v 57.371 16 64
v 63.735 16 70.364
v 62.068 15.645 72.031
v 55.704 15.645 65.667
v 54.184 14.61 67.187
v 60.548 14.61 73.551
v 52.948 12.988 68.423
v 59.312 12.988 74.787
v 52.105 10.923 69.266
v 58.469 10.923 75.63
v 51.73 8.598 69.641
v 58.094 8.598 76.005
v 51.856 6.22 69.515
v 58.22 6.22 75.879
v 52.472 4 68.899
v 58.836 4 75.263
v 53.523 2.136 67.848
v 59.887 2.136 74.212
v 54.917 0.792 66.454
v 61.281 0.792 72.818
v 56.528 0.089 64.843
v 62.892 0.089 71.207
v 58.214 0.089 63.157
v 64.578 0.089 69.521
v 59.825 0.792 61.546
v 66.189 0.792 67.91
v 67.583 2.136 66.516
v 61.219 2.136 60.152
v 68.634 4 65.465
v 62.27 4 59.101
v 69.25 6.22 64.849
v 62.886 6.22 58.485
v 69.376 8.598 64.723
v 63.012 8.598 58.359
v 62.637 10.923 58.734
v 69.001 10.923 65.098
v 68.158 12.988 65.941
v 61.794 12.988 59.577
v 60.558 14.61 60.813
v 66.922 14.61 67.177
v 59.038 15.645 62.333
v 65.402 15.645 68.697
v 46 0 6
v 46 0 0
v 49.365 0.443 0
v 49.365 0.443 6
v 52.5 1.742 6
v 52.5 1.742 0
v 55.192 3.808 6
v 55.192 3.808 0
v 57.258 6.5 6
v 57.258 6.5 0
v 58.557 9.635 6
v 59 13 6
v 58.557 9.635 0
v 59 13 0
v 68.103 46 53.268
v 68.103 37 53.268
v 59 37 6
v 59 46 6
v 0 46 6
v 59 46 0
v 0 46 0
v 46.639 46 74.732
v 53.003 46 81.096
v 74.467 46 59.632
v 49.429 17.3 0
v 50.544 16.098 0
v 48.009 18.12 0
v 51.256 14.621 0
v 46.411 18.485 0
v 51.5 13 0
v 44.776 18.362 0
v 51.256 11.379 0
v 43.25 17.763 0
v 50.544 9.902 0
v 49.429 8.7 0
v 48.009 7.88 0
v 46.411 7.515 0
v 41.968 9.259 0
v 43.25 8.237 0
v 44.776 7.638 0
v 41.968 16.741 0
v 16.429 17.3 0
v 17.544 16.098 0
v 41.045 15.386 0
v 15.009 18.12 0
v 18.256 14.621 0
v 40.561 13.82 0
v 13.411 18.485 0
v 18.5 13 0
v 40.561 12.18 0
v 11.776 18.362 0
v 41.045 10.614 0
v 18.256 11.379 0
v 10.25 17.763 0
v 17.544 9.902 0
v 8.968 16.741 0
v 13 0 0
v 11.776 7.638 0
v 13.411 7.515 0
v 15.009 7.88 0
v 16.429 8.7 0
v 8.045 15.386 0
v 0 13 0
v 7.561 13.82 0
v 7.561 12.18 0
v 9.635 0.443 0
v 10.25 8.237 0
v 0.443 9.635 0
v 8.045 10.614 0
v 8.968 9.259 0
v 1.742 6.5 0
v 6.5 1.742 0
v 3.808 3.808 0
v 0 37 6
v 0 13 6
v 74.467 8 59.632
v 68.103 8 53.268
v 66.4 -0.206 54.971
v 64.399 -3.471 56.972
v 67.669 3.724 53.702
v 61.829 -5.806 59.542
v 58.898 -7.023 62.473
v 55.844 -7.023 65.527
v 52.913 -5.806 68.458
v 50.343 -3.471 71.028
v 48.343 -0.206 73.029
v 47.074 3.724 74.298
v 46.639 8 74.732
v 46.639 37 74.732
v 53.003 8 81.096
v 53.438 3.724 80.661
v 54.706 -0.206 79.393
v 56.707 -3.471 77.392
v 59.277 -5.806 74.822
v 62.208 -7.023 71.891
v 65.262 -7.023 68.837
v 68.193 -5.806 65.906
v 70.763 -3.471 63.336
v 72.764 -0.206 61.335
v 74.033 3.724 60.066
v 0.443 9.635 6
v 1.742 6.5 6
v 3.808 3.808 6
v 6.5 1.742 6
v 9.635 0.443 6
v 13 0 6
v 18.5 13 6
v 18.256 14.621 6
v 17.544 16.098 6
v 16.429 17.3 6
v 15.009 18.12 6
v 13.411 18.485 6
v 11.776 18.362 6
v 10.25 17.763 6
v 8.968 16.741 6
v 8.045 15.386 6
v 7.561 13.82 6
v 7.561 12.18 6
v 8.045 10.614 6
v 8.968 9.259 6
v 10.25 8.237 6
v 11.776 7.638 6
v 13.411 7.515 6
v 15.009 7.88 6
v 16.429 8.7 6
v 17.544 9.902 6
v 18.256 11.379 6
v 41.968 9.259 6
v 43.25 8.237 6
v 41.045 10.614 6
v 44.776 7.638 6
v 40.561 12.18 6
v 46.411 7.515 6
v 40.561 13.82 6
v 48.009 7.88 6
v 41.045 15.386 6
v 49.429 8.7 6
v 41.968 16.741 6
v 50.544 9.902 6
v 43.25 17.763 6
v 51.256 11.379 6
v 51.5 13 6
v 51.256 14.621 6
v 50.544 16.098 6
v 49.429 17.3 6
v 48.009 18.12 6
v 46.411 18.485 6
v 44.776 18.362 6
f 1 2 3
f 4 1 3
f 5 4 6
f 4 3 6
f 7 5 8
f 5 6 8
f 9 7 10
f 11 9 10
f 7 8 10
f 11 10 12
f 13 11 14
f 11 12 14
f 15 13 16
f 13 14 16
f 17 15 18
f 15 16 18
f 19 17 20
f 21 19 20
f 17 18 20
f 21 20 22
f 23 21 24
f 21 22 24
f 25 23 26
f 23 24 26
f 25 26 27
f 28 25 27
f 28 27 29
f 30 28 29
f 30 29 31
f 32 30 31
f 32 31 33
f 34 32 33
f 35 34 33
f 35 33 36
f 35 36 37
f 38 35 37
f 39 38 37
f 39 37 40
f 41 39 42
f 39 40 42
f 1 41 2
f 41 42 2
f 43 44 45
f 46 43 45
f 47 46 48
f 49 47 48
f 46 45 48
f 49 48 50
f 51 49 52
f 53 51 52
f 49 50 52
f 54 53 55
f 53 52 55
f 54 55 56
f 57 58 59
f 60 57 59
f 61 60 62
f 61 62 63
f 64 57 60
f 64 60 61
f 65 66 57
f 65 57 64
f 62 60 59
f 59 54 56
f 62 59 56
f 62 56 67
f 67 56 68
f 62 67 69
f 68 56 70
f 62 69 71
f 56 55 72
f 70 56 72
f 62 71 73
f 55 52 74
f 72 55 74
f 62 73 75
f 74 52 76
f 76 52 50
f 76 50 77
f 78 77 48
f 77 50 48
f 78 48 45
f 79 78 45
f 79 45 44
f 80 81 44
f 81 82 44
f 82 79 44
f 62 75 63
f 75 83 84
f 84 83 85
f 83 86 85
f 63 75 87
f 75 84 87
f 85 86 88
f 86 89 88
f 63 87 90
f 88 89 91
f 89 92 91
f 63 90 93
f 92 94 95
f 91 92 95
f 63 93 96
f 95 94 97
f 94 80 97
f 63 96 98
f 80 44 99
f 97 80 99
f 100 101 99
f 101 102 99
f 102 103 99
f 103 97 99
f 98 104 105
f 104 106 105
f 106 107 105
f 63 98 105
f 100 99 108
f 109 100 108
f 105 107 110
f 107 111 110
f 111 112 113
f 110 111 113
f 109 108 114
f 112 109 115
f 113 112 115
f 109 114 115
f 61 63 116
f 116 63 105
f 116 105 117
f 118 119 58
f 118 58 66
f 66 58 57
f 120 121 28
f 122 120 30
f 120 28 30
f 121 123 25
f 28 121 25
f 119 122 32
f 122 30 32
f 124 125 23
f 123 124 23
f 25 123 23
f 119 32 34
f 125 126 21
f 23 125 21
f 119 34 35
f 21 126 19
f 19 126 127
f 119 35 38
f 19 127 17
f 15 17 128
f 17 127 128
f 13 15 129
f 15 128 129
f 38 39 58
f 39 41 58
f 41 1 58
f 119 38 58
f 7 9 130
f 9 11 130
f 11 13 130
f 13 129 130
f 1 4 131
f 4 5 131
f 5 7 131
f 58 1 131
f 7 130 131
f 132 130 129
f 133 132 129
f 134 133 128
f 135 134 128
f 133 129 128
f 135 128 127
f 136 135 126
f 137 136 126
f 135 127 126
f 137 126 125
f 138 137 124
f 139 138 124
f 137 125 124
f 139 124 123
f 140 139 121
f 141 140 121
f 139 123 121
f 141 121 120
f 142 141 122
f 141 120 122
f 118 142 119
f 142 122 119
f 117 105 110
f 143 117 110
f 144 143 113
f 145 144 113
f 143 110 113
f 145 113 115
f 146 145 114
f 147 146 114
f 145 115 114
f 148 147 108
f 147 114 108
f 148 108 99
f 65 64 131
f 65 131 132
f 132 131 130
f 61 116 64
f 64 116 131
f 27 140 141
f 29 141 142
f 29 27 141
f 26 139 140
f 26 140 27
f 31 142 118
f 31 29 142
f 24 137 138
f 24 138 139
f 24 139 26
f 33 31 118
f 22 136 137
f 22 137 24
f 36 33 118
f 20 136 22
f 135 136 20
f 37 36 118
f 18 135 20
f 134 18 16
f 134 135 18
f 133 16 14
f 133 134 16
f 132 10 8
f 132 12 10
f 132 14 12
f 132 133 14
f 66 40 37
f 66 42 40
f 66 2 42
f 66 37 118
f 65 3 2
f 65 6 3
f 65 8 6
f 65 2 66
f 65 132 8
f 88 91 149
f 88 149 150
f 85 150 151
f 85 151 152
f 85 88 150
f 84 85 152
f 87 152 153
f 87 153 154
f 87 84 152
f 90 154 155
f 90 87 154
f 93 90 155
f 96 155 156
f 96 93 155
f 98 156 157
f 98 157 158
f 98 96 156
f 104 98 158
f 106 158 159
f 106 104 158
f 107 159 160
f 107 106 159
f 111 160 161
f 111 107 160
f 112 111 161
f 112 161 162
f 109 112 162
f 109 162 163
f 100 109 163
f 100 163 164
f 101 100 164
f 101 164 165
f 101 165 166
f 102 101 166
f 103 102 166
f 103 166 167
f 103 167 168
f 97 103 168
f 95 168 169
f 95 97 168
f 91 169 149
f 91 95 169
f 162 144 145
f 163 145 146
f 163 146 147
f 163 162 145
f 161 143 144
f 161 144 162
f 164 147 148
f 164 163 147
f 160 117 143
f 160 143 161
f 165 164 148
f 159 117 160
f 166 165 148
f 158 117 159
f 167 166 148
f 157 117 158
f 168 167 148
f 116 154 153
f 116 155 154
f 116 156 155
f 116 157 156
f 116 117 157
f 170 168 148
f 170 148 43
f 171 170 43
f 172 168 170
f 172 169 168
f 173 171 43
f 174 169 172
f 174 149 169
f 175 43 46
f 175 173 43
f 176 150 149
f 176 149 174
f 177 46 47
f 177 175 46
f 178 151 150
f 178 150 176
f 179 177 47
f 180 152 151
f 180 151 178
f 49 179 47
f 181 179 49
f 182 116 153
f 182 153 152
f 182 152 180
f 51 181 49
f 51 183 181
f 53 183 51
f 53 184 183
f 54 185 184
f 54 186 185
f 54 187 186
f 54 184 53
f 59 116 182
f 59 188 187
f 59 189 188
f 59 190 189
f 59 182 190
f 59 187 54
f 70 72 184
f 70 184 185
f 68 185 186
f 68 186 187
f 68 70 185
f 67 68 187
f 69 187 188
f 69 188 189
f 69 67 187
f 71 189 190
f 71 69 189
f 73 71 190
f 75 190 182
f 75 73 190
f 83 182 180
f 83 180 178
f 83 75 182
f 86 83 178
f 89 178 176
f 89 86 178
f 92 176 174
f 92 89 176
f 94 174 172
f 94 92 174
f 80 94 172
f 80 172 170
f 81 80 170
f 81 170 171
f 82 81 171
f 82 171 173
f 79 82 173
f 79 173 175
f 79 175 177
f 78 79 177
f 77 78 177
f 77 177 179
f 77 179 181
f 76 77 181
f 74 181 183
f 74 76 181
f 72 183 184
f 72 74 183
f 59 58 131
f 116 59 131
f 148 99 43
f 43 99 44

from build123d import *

# Parameters (mm, degrees)
F0_R     = 5.5
F1_DEPTH = 6
F3_DEPTH = 9
F5_DEPTH = 9
F6_R     = 8
F7_DEPTH = 9


with BuildPart() as f1:
    # F0 (on Top) → F1 (new body)
    with BuildSketch(Plane.XY):
        with BuildLine():
            Line((59, 37), (0, 37))
            Line((0, 37), (0, 13))
            ThreePointArc((0, 13), (3.807612, 3.807612), (13, 0))
            Line((13, 0), (46, 0))
            ThreePointArc((46, 0), (55.192388, 3.807612), (59, 13))
            Line((59, 13), (59, 37))
        make_face()
        with Locations((13, 13)):
            Circle(F0_R, mode=Mode.SUBTRACT)
        with Locations((46, 13)):
            Circle(F0_R, mode=Mode.SUBTRACT)
    extrude(amount=F1_DEPTH)

    # F2 (on face) → F3 (join)
    with BuildSketch(Plane(origin=(0, 37, 0), x_dir=(-1, 0, 0), z_dir=(0, 1, 0))):
        Polygon((-68.103316, 53.267747), (-59, 6), (-59, 0), (0, 0), (0, 6), (-46.63881, 74.732253), align=None)
    extrude(amount=F3_DEPTH)

    # F4 (on face) → F5 (join)
    with BuildSketch(Plane(origin=(60.685531, 0, 60.685531), x_dir=(0, 1, 0), z_dir=(0.707107, 0, 0.707107))):
        with BuildLine():
            Line((46, 19.865064), (37, 19.865064))
            Line((37, 19.865064), (8, 19.865064))
            ThreePointArc((8, 19.865064), (-7.177698, 4.687367), (8, -10.490331))
            Line((8, -10.490331), (37, -10.490331))
            Line((37, -10.490331), (46, -10.490331))
            Line((46, -10.490331), (46, 19.865064))
        make_face()
    extrude(amount=F5_DEPTH)

    # F6 (on face) → F7 (cut)
    with BuildSketch(Plane(origin=(67.049492, 0, 67.049492), x_dir=(0, 1, 0), z_dir=(0.707107, 0, 0.707107))):
        with Locations((8, 4.687367)):
            Circle(F6_R)
    extrude(amount=-F7_DEPTH, mode=Mode.SUBTRACT)


solid = f1.part
